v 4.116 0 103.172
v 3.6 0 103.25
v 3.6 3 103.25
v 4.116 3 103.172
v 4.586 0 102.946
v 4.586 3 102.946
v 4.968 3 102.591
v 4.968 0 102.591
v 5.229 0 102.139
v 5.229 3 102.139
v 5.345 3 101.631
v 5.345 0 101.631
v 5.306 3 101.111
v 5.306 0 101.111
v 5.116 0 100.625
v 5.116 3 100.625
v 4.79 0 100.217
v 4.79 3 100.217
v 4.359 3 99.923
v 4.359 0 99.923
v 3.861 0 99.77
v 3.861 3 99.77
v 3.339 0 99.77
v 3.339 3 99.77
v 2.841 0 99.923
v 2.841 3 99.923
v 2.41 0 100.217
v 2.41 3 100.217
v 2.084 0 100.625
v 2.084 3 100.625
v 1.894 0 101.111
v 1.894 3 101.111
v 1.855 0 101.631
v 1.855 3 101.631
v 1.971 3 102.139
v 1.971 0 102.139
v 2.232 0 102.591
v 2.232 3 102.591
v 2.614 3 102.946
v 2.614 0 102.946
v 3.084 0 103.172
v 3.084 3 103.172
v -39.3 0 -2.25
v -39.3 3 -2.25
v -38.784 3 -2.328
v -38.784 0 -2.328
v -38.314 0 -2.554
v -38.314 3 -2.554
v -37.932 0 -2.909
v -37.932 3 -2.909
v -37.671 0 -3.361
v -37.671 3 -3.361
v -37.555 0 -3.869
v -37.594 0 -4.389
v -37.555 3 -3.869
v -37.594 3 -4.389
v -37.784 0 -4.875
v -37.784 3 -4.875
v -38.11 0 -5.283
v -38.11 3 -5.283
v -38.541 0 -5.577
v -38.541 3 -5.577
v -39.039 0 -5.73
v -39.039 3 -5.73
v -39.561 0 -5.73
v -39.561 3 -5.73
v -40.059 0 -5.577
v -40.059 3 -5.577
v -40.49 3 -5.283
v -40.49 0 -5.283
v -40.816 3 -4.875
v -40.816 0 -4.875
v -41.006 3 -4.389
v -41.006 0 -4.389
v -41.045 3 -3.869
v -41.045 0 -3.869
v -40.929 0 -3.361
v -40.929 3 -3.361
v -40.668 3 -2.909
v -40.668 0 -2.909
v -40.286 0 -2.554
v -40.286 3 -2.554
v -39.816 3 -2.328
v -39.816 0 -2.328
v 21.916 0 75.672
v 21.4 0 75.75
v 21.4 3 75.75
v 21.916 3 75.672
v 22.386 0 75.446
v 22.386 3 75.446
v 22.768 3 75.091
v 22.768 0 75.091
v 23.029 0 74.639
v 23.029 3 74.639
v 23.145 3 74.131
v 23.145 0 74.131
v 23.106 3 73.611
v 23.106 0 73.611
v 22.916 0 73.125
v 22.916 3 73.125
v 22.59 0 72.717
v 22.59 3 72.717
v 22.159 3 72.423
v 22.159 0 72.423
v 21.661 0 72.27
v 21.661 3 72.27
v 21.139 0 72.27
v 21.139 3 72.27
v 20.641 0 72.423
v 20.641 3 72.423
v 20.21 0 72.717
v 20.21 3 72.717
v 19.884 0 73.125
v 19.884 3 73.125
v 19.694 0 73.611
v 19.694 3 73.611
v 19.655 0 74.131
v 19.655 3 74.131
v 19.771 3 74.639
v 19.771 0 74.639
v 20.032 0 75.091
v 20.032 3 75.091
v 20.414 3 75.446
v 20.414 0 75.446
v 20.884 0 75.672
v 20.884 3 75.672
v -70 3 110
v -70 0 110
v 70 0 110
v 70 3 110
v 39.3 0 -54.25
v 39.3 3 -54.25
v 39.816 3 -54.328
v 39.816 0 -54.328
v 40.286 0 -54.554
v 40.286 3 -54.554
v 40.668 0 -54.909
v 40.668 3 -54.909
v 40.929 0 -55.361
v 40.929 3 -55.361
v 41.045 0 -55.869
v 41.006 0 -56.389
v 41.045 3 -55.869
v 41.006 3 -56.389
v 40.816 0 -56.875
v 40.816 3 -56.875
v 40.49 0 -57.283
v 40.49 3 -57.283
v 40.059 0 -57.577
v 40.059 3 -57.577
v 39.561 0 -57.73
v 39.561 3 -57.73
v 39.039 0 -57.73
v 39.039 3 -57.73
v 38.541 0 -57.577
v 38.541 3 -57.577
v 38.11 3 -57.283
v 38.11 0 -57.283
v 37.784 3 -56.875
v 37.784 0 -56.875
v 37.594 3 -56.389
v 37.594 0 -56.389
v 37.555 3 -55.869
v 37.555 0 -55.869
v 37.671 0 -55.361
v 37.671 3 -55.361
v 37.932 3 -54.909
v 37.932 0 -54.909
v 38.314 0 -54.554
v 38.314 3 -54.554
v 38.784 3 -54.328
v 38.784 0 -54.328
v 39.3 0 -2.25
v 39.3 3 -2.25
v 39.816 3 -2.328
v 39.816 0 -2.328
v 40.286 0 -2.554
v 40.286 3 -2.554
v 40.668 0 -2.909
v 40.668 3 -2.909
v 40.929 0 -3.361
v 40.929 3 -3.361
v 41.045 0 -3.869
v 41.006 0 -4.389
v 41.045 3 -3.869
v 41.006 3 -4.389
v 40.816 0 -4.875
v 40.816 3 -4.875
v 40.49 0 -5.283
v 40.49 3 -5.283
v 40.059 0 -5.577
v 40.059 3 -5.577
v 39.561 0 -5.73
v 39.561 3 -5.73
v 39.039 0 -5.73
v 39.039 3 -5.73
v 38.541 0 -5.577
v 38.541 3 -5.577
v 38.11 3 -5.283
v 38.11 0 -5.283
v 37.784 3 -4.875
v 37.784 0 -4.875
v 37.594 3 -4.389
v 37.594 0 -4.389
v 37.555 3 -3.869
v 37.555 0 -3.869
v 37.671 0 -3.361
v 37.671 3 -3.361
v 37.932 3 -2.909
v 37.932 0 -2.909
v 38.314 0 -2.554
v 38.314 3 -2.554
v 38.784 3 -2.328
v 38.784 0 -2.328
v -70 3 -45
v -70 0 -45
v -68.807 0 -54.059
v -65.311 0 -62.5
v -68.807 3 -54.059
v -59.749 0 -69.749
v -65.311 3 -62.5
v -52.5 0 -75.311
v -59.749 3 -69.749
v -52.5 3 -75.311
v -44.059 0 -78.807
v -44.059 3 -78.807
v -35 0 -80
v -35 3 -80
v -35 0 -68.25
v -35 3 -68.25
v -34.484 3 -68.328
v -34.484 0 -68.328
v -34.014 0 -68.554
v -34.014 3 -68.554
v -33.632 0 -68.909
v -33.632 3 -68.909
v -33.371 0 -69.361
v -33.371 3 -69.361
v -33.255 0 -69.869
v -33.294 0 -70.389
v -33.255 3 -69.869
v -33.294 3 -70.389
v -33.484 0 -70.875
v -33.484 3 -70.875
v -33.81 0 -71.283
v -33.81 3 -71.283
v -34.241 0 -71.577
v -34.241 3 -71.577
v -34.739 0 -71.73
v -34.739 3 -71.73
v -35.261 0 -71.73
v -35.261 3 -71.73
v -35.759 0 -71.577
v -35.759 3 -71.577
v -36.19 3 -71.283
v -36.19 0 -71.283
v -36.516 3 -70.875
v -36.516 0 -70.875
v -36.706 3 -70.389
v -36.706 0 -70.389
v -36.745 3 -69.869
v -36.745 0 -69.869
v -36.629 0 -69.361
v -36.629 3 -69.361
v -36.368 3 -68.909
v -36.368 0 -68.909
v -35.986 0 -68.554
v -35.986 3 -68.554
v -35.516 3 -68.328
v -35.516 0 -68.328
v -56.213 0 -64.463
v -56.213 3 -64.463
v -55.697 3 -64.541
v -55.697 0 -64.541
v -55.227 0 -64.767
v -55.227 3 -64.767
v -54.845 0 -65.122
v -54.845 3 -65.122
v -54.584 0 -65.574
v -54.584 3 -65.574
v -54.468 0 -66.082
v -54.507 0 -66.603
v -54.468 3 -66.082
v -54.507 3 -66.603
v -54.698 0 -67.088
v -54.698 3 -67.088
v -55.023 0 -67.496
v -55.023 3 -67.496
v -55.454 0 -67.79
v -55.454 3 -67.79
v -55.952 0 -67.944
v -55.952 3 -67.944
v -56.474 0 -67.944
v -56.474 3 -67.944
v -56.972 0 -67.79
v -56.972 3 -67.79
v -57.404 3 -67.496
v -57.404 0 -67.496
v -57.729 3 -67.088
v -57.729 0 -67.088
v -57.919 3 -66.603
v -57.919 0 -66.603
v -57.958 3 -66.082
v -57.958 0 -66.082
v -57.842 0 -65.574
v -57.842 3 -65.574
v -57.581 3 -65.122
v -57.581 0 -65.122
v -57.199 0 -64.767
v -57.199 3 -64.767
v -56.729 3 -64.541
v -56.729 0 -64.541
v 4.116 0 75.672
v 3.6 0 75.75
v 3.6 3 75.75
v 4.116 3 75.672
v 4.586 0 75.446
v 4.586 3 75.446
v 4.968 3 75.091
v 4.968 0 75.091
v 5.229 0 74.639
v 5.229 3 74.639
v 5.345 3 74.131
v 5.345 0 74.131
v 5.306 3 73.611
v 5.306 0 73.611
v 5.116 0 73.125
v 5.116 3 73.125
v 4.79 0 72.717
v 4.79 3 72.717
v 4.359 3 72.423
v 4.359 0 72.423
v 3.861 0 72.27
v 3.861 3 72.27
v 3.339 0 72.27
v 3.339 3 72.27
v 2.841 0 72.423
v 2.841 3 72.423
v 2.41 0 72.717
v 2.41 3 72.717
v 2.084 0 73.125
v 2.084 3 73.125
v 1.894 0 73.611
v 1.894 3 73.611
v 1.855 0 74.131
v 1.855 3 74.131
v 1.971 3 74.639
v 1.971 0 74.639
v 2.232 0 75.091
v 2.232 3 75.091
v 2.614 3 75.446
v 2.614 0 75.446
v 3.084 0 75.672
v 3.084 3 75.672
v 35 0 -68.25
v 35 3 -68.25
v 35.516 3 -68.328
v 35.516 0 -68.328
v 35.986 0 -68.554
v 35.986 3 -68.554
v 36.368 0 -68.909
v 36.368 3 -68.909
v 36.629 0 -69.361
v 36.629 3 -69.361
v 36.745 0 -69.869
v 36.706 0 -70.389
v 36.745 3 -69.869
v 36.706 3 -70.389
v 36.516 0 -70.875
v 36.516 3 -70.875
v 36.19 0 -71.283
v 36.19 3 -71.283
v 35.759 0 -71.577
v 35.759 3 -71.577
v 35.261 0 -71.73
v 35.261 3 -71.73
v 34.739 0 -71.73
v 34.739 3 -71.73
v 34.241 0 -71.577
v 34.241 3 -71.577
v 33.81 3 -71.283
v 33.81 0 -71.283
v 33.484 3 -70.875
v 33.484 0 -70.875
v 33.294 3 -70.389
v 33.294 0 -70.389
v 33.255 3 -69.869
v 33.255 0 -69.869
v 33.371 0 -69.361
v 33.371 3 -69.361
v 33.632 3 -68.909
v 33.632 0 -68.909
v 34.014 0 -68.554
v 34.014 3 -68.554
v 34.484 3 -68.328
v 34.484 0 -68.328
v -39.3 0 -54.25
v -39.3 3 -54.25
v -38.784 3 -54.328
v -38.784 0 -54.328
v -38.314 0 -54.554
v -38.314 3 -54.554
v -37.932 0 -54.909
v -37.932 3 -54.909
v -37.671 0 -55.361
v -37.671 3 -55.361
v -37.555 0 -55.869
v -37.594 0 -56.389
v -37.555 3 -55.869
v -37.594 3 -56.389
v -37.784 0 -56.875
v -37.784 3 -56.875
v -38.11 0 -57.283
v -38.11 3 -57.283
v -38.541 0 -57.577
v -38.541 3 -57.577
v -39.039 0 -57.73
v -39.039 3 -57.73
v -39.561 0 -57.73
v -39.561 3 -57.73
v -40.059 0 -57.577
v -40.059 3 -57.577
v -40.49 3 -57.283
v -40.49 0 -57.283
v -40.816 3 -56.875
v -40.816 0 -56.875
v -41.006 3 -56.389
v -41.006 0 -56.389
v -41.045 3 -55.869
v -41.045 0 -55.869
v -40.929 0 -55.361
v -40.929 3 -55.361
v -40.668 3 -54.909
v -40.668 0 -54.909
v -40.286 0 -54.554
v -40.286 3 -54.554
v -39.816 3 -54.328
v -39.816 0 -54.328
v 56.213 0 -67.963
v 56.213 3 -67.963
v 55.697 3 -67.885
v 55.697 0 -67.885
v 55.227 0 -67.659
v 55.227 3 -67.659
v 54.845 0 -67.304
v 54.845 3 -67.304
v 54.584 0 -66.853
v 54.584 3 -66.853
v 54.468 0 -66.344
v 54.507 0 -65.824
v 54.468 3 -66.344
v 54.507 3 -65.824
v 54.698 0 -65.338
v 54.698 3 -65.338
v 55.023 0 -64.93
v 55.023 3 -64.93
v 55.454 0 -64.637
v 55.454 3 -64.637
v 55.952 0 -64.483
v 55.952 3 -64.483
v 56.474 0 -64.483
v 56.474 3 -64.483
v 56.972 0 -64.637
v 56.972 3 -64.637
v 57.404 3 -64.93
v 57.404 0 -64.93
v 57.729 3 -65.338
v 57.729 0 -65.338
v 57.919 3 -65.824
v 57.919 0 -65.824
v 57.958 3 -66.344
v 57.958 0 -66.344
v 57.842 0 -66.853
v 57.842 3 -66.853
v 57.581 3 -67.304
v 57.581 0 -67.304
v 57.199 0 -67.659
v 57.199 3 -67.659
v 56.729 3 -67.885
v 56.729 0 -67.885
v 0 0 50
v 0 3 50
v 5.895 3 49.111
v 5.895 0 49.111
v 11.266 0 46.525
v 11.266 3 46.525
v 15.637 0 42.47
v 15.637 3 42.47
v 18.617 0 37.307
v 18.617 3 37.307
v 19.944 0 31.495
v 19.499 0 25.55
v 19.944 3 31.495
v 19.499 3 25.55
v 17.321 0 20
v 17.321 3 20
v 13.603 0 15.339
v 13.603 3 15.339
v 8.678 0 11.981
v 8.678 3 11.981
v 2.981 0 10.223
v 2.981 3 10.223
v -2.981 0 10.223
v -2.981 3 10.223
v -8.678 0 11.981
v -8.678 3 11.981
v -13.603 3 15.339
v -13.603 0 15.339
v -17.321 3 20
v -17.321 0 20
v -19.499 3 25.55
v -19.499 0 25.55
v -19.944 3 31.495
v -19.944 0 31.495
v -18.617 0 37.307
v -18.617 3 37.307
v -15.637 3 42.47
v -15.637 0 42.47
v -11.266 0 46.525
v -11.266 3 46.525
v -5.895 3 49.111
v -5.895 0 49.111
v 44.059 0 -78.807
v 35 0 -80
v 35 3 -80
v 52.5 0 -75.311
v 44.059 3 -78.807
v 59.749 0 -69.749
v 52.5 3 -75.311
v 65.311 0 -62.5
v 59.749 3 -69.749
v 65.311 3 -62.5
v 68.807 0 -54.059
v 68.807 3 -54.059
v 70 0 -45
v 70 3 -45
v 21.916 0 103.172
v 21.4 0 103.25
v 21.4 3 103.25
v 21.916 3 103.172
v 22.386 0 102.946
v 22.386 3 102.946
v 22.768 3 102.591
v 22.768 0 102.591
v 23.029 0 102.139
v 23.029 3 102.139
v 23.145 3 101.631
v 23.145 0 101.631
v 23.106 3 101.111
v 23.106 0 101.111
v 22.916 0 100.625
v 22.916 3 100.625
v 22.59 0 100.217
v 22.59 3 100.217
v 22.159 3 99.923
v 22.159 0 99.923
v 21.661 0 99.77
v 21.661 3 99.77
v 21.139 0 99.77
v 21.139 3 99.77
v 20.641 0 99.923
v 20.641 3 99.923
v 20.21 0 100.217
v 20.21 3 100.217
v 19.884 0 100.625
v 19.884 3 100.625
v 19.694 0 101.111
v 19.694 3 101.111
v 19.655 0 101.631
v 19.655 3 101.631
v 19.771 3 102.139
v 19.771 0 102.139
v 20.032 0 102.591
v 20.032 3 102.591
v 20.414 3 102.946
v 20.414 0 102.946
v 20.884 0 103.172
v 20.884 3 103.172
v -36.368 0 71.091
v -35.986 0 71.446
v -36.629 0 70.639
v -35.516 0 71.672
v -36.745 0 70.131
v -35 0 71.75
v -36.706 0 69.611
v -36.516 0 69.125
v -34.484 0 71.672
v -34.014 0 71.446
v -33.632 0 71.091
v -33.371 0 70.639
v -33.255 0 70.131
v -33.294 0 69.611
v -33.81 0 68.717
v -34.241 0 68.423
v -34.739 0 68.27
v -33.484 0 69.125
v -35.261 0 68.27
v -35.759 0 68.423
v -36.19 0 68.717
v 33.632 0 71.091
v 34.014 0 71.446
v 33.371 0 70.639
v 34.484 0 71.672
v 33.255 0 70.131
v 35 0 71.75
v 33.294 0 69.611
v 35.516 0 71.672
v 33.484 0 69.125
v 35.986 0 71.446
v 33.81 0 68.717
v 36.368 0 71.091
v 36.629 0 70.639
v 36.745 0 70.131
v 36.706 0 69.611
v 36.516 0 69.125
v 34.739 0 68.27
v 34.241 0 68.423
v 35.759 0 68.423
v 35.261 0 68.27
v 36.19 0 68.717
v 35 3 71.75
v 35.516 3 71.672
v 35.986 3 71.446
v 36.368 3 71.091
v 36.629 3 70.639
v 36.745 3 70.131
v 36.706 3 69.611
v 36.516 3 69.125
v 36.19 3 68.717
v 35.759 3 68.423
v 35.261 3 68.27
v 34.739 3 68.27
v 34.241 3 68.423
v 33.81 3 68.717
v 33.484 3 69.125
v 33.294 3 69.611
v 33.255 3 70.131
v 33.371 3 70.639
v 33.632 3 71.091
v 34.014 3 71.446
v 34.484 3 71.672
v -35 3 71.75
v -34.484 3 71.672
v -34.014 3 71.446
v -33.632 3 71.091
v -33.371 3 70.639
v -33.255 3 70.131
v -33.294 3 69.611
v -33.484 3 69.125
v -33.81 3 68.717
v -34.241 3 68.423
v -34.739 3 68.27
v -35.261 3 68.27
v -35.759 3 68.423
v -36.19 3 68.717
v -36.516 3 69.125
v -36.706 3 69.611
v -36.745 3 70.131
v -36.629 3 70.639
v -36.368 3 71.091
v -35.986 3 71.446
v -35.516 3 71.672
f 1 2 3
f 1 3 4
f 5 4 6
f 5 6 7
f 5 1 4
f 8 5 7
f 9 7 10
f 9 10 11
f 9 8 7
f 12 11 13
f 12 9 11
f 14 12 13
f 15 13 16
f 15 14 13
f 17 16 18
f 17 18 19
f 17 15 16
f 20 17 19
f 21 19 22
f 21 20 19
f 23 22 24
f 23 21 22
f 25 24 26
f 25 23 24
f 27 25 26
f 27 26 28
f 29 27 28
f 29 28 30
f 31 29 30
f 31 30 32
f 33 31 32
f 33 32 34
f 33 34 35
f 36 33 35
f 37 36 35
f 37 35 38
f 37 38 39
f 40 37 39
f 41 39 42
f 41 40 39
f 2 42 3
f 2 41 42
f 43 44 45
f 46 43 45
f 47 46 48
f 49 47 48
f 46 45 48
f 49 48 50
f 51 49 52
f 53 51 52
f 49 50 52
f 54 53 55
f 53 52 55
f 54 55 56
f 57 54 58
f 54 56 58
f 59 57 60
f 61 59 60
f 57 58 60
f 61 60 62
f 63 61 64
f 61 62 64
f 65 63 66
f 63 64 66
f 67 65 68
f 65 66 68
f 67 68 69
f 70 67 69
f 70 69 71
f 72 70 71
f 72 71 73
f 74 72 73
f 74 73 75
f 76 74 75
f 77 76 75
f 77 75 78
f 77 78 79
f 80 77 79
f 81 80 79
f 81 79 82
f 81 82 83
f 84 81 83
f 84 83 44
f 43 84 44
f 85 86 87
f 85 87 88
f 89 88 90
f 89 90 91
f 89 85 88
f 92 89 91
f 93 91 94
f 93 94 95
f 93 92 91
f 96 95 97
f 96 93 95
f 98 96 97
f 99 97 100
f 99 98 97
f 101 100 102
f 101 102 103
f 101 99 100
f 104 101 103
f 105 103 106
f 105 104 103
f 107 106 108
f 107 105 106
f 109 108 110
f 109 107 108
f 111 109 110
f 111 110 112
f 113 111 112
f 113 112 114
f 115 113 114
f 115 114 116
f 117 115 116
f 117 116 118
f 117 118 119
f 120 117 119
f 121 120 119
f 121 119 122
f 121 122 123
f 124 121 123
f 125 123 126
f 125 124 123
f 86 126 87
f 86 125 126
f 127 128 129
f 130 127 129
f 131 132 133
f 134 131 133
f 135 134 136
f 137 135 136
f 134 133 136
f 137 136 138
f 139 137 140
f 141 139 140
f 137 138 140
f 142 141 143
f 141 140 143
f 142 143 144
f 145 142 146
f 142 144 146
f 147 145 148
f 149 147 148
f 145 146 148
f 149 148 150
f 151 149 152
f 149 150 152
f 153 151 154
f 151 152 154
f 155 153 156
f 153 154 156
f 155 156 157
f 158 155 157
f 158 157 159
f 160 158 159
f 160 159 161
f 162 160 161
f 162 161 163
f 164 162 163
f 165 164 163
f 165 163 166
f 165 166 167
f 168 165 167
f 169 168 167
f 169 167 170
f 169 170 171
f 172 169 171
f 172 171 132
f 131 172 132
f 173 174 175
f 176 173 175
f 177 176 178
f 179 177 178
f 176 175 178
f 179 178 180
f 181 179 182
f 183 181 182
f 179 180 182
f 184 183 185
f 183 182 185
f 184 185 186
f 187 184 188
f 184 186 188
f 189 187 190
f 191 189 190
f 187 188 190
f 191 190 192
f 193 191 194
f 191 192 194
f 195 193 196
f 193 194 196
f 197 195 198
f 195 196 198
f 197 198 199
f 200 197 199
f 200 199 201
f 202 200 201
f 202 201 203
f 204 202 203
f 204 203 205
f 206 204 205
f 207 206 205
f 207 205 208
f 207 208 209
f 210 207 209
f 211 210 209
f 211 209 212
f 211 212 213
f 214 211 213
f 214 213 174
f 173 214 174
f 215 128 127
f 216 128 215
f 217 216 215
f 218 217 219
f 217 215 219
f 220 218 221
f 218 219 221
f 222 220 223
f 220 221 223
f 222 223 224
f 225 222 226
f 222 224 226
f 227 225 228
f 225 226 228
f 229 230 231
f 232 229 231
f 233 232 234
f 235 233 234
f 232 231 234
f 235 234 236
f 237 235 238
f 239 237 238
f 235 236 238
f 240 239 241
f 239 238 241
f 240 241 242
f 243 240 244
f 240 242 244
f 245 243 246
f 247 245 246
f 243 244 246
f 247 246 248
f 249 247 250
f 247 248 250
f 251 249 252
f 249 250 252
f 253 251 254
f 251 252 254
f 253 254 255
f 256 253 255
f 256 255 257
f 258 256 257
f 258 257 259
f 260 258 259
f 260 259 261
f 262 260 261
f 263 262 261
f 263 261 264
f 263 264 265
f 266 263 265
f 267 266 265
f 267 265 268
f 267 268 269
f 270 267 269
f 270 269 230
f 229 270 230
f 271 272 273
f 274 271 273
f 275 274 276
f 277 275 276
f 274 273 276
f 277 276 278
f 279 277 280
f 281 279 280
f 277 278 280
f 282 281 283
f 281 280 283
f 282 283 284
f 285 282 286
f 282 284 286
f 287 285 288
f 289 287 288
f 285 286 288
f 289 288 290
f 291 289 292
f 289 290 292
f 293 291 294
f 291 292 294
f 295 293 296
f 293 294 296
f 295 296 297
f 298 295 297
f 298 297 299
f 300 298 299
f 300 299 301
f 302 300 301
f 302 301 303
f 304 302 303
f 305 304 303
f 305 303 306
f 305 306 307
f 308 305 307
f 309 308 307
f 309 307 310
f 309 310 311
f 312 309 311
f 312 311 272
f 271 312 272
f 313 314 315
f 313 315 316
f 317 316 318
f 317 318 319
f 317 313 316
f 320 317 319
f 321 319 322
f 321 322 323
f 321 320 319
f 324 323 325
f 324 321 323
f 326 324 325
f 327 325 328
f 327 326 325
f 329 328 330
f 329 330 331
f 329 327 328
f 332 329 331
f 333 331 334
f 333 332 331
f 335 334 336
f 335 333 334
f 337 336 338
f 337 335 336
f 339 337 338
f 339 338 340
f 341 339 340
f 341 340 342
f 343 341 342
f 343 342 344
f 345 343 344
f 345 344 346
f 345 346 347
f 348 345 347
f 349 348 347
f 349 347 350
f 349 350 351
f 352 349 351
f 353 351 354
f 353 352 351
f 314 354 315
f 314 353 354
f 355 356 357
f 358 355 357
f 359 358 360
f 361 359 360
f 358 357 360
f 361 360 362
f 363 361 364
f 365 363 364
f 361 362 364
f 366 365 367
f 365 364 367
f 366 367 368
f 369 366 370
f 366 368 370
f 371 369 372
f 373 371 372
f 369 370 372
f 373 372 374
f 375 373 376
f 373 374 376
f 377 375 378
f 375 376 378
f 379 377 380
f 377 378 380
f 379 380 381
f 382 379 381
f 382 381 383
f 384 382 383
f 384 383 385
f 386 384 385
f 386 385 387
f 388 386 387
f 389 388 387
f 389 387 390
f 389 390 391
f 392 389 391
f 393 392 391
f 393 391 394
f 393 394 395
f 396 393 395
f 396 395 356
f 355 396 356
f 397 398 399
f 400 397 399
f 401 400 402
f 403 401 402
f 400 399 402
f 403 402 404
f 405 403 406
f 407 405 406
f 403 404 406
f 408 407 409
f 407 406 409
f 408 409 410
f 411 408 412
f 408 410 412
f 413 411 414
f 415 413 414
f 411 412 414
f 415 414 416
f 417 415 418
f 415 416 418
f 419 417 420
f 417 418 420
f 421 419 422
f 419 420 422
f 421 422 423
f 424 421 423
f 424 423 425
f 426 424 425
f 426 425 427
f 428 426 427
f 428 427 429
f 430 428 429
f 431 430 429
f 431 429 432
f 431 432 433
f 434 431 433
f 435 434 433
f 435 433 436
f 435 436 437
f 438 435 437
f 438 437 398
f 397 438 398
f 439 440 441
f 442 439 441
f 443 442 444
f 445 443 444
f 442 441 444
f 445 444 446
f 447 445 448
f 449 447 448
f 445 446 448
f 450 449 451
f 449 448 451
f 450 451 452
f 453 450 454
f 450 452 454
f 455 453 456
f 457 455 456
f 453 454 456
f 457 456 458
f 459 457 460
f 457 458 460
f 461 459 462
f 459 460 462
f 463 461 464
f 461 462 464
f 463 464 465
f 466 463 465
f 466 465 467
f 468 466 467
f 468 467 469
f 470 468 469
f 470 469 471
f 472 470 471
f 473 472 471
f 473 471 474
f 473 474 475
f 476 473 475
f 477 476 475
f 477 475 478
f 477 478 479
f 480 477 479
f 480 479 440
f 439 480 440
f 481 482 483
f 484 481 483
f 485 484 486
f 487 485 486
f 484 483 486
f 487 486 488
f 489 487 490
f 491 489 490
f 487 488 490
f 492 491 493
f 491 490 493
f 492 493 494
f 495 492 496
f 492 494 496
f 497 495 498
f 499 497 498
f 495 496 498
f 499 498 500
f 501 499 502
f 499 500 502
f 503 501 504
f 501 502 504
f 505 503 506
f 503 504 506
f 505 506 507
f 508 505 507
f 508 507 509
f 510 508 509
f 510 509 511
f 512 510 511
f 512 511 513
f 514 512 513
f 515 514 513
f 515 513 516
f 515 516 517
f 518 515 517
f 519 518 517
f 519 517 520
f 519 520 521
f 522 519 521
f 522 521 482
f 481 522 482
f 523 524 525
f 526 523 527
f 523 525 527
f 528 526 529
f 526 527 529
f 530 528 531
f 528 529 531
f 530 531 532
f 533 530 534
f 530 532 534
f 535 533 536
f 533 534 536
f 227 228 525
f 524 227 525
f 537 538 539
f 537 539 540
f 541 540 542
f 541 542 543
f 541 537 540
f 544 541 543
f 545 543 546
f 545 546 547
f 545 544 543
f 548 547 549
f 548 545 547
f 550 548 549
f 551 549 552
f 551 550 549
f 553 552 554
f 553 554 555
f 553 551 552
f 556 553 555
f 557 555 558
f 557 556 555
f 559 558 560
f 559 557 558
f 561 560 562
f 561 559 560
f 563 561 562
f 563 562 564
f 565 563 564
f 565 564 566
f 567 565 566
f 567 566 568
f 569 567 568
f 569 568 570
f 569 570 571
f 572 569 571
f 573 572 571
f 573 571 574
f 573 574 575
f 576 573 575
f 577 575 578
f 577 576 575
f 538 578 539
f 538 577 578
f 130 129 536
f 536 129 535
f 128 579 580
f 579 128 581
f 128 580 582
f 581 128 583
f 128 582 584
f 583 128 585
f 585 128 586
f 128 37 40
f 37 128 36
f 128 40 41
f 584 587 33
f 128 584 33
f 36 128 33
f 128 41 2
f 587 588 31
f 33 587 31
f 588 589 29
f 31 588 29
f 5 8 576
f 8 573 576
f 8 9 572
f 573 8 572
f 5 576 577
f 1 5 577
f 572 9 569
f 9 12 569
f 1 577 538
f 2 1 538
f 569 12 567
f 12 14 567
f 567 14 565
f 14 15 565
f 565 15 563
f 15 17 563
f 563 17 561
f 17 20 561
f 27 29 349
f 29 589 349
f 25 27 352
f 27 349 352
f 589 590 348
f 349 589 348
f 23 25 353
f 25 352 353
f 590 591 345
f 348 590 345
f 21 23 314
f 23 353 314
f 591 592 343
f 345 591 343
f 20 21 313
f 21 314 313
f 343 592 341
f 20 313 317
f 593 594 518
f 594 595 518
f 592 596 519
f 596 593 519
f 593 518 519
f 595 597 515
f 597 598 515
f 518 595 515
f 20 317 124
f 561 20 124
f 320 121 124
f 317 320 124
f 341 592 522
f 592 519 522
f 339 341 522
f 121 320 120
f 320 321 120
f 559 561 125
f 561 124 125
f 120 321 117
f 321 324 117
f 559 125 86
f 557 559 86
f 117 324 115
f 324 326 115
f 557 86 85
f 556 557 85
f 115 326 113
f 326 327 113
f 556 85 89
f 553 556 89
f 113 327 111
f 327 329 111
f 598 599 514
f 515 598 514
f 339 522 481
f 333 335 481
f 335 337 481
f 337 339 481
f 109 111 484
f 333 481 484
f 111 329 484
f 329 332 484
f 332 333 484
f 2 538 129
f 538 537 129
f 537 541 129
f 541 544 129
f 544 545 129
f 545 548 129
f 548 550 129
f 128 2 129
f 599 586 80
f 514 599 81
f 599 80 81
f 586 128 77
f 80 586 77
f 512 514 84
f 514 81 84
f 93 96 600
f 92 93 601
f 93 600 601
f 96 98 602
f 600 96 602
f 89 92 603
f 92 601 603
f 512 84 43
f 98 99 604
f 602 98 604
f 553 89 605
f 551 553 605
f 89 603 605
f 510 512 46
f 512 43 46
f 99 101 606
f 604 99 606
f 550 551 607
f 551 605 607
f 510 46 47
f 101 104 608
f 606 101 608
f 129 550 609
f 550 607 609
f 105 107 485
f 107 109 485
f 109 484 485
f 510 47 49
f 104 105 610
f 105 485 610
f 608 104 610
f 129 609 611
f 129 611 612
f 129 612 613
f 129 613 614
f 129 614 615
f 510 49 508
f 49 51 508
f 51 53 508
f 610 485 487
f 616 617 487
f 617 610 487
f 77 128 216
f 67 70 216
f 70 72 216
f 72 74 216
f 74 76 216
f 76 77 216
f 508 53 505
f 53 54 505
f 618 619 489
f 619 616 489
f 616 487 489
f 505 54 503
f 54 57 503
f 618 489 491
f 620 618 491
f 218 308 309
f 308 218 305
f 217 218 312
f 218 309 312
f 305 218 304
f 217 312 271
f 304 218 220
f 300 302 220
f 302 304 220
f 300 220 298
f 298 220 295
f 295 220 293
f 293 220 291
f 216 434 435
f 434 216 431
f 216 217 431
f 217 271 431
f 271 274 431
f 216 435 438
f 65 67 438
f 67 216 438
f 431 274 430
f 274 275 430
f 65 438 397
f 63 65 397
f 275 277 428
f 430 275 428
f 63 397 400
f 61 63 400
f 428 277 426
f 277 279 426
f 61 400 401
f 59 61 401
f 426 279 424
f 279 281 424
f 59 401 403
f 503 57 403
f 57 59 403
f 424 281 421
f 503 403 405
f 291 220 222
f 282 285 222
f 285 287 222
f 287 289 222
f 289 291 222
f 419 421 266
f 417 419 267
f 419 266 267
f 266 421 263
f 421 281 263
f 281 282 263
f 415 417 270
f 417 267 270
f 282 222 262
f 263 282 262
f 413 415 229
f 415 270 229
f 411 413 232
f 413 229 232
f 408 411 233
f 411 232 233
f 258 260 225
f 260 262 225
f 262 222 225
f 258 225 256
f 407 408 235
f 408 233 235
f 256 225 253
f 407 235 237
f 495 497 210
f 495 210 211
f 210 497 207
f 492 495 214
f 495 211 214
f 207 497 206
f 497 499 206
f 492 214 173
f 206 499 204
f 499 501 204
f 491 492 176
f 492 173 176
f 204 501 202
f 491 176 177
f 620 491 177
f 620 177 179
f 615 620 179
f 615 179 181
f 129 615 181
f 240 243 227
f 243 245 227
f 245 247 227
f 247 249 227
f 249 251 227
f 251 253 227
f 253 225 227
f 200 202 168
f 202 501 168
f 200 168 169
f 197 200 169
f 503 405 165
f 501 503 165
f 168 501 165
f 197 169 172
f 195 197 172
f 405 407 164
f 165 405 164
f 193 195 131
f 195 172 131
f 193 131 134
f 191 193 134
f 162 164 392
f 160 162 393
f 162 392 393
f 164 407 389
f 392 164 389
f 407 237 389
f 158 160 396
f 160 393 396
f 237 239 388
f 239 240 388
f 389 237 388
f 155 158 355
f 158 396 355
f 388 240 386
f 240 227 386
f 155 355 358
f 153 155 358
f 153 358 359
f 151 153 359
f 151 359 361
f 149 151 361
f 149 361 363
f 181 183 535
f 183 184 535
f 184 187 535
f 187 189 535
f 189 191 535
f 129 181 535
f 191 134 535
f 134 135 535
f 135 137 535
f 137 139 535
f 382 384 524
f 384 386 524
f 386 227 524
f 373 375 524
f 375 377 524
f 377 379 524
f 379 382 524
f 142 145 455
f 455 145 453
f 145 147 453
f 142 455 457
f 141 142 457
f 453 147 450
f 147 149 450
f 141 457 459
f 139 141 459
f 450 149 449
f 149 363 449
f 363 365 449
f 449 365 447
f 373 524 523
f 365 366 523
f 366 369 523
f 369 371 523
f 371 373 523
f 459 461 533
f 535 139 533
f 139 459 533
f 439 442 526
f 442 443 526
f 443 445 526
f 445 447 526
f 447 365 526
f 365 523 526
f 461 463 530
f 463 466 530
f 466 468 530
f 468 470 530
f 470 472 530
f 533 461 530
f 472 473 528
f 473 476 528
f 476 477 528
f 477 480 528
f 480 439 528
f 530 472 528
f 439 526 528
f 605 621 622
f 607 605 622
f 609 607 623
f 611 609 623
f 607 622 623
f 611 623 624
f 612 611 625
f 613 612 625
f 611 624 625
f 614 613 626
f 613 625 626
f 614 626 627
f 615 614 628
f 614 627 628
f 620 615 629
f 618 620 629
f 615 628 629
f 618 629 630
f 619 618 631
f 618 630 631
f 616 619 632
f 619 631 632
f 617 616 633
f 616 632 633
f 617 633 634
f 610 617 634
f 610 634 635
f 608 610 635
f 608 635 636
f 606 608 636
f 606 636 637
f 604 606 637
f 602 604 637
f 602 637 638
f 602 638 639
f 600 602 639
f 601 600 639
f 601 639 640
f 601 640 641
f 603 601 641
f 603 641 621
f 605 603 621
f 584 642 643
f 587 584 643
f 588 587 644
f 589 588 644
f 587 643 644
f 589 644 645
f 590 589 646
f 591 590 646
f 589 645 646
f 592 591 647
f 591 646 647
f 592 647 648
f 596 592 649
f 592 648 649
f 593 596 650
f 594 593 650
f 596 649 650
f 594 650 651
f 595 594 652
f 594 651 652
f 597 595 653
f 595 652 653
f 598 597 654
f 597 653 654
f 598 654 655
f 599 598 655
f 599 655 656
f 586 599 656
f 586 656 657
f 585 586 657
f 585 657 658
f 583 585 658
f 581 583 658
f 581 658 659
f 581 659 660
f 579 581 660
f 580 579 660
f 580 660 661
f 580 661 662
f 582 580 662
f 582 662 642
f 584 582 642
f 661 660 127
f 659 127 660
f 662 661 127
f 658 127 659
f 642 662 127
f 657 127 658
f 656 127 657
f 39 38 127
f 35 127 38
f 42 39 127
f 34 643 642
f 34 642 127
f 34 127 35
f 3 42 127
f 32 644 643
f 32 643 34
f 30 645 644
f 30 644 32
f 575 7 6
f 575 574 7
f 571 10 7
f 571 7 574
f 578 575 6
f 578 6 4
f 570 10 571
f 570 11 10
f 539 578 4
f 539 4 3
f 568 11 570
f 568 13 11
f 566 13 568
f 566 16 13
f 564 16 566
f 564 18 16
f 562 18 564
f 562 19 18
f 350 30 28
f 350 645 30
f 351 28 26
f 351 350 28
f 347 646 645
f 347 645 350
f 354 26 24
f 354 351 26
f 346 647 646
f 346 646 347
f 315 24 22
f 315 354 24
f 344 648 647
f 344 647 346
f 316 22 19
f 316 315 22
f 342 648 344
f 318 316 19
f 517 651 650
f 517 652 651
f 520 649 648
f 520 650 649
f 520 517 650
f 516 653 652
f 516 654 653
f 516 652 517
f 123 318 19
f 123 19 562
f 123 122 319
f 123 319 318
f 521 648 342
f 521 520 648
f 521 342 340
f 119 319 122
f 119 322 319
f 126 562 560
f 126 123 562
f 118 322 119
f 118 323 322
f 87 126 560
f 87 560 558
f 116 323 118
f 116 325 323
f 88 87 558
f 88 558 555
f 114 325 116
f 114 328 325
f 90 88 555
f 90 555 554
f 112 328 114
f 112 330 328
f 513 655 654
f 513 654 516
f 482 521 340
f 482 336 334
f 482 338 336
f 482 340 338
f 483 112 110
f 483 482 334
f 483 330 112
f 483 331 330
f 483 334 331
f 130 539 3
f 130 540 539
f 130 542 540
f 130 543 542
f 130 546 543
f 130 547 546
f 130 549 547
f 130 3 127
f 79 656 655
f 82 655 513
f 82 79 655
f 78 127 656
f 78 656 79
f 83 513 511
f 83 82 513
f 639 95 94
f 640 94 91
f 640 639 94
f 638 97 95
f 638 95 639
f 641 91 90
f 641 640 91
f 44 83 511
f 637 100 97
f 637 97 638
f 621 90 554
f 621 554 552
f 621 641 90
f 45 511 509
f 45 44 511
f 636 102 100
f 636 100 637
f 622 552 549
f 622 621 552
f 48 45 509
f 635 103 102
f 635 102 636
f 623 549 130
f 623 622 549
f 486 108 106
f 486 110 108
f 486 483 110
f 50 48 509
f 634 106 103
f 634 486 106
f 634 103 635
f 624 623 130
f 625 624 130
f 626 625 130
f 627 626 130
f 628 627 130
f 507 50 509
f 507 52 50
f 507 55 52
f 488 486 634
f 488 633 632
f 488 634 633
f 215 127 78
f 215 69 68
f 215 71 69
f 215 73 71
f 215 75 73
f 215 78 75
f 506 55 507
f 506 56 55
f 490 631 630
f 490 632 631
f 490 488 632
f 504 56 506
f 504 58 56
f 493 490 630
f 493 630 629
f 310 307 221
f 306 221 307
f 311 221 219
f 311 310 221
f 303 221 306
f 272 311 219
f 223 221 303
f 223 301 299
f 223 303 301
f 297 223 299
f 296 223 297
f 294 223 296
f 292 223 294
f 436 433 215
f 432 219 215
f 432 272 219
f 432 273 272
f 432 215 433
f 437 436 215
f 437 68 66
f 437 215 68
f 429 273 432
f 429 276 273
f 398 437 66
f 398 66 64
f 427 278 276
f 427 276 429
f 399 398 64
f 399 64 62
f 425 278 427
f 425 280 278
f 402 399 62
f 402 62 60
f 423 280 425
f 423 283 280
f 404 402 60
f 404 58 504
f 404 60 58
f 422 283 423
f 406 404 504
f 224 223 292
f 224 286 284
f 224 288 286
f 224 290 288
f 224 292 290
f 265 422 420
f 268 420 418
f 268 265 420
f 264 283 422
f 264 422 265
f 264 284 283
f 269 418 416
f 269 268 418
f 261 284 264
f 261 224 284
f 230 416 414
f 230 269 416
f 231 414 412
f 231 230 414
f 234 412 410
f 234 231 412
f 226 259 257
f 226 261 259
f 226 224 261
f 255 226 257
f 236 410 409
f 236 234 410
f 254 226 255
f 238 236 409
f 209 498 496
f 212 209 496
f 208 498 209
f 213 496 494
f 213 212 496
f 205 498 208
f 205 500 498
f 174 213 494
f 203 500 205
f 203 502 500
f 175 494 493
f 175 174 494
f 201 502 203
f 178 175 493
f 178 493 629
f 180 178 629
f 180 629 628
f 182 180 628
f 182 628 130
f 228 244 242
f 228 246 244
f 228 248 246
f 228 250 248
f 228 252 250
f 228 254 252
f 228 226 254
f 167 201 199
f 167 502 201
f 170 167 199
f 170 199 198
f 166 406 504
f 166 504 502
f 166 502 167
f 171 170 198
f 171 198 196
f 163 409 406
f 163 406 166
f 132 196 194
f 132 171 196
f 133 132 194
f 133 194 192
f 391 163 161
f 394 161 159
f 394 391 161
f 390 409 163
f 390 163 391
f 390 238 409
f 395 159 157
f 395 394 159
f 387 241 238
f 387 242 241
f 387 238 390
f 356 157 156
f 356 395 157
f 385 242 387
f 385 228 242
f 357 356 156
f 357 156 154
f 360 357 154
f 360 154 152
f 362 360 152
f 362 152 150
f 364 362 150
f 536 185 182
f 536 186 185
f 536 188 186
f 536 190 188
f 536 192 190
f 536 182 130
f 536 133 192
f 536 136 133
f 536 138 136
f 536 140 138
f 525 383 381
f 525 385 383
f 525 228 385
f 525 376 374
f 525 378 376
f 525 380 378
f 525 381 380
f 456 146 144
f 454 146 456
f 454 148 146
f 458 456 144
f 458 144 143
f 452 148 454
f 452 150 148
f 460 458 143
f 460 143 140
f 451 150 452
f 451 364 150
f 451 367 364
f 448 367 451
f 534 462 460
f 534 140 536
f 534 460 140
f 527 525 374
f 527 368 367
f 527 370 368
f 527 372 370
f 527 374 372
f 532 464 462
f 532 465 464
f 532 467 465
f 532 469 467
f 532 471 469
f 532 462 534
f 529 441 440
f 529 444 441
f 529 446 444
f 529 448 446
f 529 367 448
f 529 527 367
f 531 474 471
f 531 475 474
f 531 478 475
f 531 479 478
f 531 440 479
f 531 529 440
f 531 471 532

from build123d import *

# Parameters (mm, degrees)
SKETCH_1_W          = 140
SKETCH_1_H          = 220
SKETCH_1_R          = 1.75
EXTRUDE_1_DEPTH     = 3
SKETCH_2_R          = 1.75
SKETCH_2_R_2        = 20
CUT_EXTRUDE_1_DEPTH = 131.418556962
SKETCH_3_R          = 1.75
CUT_EXTRUDE_2_DEPTH = 131.418556962


with BuildPart() as part:
    # 草图1 → 凸台-拉伸1 (new body)
    with BuildSketch(Plane(origin=(0, 0, 0), x_dir=(1, 0, 0), z_dir=(0, 1, 0))):
        Rectangle(SKETCH_1_W, SKETCH_1_H)
        with Locations(Location((21.4, -74, 0), (0, 0, 270))):
            Circle(SKETCH_1_R, mode=Mode.SUBTRACT)
        with Locations(Location((21.4, -101.5, 0), (0, 0, 270))):
            Circle(SKETCH_1_R, mode=Mode.SUBTRACT)
        with Locations(Location((3.6, -101.5, 0), (0, 0, 270))):
            Circle(SKETCH_1_R, mode=Mode.SUBTRACT)
        with Locations(Location((3.6, -74, 0), (0, 0, 270))):
            Circle(SKETCH_1_R, mode=Mode.SUBTRACT)
    extrude(amount=EXTRUDE_1_DEPTH)

    # 草图2 → 切除-拉伸1 (cut, through all)
    with BuildSketch(Plane(origin=(0, 3, 0), x_dir=(1, 0, 0), z_dir=(0, 1, 0))):
        with Locations(Location((-35, 70, 0), (0, 0, 270))):
            Circle(SKETCH_2_R)
        with Locations(Location((35, 70, 0), (0, 0, 270))):
            Circle(SKETCH_2_R)
        with Locations(Location((-35, -70, 0), (0, 0, 270))):
            Circle(SKETCH_2_R)
        with Locations(Location((35, -70, 0), (0, 0, 270))):
            Circle(SKETCH_2_R)
        with Locations(Location((0, -30, 0), (0, 0, 270))):
            Circle(SKETCH_2_R_2)
    extrude(amount=-CUT_EXTRUDE_1_DEPTH, mode=Mode.SUBTRACT)

    # 草图3 → 切除-拉伸2 (cut, through all)
    with BuildSketch(Plane(origin=(0, 3, 0), x_dir=(1, 0, 0), z_dir=(0, 1, 0))):
        with Locations(Location((-39.3, 56, 0), (0, 0, 270))):
            Circle(SKETCH_3_R)
        with Locations(Location((-39.3, 4, 0), (0, 0, 270))):
            Circle(SKETCH_3_R)
        with Locations(Location((39.3, 4, 0), (0, 0, 270))):
            Circle(SKETCH_3_R)
        with Locations(Location((39.3, 56, 0), (0, 0, 270))):
            Circle(SKETCH_3_R)
        with Locations(Location((-56.213203436, 66.213203436, 0), (0, 0, 270))):
            Circle(SKETCH_3_R)
        with Locations(Location((56.213203436, 66.213203436, 0), (0, 0, 90))):
            Circle(SKETCH_3_R)
        with BuildLine():
            Line((-35, 80), (35, 80))
            ThreePointArc((35, 80), (59.748737342, 69.748737342), (70, 45))
            Line((70, 45), (70, 110))
            Line((70, 110), (-70, 110))
            Line((-70, 110), (-70, 45))
            ThreePointArc((-70, 45), (-59.748737342, 69.748737342), (-35, 80))
        make_face()
    extrude(amount=-CUT_EXTRUDE_2_DEPTH, mode=Mode.SUBTRACT)


solid = part.part
